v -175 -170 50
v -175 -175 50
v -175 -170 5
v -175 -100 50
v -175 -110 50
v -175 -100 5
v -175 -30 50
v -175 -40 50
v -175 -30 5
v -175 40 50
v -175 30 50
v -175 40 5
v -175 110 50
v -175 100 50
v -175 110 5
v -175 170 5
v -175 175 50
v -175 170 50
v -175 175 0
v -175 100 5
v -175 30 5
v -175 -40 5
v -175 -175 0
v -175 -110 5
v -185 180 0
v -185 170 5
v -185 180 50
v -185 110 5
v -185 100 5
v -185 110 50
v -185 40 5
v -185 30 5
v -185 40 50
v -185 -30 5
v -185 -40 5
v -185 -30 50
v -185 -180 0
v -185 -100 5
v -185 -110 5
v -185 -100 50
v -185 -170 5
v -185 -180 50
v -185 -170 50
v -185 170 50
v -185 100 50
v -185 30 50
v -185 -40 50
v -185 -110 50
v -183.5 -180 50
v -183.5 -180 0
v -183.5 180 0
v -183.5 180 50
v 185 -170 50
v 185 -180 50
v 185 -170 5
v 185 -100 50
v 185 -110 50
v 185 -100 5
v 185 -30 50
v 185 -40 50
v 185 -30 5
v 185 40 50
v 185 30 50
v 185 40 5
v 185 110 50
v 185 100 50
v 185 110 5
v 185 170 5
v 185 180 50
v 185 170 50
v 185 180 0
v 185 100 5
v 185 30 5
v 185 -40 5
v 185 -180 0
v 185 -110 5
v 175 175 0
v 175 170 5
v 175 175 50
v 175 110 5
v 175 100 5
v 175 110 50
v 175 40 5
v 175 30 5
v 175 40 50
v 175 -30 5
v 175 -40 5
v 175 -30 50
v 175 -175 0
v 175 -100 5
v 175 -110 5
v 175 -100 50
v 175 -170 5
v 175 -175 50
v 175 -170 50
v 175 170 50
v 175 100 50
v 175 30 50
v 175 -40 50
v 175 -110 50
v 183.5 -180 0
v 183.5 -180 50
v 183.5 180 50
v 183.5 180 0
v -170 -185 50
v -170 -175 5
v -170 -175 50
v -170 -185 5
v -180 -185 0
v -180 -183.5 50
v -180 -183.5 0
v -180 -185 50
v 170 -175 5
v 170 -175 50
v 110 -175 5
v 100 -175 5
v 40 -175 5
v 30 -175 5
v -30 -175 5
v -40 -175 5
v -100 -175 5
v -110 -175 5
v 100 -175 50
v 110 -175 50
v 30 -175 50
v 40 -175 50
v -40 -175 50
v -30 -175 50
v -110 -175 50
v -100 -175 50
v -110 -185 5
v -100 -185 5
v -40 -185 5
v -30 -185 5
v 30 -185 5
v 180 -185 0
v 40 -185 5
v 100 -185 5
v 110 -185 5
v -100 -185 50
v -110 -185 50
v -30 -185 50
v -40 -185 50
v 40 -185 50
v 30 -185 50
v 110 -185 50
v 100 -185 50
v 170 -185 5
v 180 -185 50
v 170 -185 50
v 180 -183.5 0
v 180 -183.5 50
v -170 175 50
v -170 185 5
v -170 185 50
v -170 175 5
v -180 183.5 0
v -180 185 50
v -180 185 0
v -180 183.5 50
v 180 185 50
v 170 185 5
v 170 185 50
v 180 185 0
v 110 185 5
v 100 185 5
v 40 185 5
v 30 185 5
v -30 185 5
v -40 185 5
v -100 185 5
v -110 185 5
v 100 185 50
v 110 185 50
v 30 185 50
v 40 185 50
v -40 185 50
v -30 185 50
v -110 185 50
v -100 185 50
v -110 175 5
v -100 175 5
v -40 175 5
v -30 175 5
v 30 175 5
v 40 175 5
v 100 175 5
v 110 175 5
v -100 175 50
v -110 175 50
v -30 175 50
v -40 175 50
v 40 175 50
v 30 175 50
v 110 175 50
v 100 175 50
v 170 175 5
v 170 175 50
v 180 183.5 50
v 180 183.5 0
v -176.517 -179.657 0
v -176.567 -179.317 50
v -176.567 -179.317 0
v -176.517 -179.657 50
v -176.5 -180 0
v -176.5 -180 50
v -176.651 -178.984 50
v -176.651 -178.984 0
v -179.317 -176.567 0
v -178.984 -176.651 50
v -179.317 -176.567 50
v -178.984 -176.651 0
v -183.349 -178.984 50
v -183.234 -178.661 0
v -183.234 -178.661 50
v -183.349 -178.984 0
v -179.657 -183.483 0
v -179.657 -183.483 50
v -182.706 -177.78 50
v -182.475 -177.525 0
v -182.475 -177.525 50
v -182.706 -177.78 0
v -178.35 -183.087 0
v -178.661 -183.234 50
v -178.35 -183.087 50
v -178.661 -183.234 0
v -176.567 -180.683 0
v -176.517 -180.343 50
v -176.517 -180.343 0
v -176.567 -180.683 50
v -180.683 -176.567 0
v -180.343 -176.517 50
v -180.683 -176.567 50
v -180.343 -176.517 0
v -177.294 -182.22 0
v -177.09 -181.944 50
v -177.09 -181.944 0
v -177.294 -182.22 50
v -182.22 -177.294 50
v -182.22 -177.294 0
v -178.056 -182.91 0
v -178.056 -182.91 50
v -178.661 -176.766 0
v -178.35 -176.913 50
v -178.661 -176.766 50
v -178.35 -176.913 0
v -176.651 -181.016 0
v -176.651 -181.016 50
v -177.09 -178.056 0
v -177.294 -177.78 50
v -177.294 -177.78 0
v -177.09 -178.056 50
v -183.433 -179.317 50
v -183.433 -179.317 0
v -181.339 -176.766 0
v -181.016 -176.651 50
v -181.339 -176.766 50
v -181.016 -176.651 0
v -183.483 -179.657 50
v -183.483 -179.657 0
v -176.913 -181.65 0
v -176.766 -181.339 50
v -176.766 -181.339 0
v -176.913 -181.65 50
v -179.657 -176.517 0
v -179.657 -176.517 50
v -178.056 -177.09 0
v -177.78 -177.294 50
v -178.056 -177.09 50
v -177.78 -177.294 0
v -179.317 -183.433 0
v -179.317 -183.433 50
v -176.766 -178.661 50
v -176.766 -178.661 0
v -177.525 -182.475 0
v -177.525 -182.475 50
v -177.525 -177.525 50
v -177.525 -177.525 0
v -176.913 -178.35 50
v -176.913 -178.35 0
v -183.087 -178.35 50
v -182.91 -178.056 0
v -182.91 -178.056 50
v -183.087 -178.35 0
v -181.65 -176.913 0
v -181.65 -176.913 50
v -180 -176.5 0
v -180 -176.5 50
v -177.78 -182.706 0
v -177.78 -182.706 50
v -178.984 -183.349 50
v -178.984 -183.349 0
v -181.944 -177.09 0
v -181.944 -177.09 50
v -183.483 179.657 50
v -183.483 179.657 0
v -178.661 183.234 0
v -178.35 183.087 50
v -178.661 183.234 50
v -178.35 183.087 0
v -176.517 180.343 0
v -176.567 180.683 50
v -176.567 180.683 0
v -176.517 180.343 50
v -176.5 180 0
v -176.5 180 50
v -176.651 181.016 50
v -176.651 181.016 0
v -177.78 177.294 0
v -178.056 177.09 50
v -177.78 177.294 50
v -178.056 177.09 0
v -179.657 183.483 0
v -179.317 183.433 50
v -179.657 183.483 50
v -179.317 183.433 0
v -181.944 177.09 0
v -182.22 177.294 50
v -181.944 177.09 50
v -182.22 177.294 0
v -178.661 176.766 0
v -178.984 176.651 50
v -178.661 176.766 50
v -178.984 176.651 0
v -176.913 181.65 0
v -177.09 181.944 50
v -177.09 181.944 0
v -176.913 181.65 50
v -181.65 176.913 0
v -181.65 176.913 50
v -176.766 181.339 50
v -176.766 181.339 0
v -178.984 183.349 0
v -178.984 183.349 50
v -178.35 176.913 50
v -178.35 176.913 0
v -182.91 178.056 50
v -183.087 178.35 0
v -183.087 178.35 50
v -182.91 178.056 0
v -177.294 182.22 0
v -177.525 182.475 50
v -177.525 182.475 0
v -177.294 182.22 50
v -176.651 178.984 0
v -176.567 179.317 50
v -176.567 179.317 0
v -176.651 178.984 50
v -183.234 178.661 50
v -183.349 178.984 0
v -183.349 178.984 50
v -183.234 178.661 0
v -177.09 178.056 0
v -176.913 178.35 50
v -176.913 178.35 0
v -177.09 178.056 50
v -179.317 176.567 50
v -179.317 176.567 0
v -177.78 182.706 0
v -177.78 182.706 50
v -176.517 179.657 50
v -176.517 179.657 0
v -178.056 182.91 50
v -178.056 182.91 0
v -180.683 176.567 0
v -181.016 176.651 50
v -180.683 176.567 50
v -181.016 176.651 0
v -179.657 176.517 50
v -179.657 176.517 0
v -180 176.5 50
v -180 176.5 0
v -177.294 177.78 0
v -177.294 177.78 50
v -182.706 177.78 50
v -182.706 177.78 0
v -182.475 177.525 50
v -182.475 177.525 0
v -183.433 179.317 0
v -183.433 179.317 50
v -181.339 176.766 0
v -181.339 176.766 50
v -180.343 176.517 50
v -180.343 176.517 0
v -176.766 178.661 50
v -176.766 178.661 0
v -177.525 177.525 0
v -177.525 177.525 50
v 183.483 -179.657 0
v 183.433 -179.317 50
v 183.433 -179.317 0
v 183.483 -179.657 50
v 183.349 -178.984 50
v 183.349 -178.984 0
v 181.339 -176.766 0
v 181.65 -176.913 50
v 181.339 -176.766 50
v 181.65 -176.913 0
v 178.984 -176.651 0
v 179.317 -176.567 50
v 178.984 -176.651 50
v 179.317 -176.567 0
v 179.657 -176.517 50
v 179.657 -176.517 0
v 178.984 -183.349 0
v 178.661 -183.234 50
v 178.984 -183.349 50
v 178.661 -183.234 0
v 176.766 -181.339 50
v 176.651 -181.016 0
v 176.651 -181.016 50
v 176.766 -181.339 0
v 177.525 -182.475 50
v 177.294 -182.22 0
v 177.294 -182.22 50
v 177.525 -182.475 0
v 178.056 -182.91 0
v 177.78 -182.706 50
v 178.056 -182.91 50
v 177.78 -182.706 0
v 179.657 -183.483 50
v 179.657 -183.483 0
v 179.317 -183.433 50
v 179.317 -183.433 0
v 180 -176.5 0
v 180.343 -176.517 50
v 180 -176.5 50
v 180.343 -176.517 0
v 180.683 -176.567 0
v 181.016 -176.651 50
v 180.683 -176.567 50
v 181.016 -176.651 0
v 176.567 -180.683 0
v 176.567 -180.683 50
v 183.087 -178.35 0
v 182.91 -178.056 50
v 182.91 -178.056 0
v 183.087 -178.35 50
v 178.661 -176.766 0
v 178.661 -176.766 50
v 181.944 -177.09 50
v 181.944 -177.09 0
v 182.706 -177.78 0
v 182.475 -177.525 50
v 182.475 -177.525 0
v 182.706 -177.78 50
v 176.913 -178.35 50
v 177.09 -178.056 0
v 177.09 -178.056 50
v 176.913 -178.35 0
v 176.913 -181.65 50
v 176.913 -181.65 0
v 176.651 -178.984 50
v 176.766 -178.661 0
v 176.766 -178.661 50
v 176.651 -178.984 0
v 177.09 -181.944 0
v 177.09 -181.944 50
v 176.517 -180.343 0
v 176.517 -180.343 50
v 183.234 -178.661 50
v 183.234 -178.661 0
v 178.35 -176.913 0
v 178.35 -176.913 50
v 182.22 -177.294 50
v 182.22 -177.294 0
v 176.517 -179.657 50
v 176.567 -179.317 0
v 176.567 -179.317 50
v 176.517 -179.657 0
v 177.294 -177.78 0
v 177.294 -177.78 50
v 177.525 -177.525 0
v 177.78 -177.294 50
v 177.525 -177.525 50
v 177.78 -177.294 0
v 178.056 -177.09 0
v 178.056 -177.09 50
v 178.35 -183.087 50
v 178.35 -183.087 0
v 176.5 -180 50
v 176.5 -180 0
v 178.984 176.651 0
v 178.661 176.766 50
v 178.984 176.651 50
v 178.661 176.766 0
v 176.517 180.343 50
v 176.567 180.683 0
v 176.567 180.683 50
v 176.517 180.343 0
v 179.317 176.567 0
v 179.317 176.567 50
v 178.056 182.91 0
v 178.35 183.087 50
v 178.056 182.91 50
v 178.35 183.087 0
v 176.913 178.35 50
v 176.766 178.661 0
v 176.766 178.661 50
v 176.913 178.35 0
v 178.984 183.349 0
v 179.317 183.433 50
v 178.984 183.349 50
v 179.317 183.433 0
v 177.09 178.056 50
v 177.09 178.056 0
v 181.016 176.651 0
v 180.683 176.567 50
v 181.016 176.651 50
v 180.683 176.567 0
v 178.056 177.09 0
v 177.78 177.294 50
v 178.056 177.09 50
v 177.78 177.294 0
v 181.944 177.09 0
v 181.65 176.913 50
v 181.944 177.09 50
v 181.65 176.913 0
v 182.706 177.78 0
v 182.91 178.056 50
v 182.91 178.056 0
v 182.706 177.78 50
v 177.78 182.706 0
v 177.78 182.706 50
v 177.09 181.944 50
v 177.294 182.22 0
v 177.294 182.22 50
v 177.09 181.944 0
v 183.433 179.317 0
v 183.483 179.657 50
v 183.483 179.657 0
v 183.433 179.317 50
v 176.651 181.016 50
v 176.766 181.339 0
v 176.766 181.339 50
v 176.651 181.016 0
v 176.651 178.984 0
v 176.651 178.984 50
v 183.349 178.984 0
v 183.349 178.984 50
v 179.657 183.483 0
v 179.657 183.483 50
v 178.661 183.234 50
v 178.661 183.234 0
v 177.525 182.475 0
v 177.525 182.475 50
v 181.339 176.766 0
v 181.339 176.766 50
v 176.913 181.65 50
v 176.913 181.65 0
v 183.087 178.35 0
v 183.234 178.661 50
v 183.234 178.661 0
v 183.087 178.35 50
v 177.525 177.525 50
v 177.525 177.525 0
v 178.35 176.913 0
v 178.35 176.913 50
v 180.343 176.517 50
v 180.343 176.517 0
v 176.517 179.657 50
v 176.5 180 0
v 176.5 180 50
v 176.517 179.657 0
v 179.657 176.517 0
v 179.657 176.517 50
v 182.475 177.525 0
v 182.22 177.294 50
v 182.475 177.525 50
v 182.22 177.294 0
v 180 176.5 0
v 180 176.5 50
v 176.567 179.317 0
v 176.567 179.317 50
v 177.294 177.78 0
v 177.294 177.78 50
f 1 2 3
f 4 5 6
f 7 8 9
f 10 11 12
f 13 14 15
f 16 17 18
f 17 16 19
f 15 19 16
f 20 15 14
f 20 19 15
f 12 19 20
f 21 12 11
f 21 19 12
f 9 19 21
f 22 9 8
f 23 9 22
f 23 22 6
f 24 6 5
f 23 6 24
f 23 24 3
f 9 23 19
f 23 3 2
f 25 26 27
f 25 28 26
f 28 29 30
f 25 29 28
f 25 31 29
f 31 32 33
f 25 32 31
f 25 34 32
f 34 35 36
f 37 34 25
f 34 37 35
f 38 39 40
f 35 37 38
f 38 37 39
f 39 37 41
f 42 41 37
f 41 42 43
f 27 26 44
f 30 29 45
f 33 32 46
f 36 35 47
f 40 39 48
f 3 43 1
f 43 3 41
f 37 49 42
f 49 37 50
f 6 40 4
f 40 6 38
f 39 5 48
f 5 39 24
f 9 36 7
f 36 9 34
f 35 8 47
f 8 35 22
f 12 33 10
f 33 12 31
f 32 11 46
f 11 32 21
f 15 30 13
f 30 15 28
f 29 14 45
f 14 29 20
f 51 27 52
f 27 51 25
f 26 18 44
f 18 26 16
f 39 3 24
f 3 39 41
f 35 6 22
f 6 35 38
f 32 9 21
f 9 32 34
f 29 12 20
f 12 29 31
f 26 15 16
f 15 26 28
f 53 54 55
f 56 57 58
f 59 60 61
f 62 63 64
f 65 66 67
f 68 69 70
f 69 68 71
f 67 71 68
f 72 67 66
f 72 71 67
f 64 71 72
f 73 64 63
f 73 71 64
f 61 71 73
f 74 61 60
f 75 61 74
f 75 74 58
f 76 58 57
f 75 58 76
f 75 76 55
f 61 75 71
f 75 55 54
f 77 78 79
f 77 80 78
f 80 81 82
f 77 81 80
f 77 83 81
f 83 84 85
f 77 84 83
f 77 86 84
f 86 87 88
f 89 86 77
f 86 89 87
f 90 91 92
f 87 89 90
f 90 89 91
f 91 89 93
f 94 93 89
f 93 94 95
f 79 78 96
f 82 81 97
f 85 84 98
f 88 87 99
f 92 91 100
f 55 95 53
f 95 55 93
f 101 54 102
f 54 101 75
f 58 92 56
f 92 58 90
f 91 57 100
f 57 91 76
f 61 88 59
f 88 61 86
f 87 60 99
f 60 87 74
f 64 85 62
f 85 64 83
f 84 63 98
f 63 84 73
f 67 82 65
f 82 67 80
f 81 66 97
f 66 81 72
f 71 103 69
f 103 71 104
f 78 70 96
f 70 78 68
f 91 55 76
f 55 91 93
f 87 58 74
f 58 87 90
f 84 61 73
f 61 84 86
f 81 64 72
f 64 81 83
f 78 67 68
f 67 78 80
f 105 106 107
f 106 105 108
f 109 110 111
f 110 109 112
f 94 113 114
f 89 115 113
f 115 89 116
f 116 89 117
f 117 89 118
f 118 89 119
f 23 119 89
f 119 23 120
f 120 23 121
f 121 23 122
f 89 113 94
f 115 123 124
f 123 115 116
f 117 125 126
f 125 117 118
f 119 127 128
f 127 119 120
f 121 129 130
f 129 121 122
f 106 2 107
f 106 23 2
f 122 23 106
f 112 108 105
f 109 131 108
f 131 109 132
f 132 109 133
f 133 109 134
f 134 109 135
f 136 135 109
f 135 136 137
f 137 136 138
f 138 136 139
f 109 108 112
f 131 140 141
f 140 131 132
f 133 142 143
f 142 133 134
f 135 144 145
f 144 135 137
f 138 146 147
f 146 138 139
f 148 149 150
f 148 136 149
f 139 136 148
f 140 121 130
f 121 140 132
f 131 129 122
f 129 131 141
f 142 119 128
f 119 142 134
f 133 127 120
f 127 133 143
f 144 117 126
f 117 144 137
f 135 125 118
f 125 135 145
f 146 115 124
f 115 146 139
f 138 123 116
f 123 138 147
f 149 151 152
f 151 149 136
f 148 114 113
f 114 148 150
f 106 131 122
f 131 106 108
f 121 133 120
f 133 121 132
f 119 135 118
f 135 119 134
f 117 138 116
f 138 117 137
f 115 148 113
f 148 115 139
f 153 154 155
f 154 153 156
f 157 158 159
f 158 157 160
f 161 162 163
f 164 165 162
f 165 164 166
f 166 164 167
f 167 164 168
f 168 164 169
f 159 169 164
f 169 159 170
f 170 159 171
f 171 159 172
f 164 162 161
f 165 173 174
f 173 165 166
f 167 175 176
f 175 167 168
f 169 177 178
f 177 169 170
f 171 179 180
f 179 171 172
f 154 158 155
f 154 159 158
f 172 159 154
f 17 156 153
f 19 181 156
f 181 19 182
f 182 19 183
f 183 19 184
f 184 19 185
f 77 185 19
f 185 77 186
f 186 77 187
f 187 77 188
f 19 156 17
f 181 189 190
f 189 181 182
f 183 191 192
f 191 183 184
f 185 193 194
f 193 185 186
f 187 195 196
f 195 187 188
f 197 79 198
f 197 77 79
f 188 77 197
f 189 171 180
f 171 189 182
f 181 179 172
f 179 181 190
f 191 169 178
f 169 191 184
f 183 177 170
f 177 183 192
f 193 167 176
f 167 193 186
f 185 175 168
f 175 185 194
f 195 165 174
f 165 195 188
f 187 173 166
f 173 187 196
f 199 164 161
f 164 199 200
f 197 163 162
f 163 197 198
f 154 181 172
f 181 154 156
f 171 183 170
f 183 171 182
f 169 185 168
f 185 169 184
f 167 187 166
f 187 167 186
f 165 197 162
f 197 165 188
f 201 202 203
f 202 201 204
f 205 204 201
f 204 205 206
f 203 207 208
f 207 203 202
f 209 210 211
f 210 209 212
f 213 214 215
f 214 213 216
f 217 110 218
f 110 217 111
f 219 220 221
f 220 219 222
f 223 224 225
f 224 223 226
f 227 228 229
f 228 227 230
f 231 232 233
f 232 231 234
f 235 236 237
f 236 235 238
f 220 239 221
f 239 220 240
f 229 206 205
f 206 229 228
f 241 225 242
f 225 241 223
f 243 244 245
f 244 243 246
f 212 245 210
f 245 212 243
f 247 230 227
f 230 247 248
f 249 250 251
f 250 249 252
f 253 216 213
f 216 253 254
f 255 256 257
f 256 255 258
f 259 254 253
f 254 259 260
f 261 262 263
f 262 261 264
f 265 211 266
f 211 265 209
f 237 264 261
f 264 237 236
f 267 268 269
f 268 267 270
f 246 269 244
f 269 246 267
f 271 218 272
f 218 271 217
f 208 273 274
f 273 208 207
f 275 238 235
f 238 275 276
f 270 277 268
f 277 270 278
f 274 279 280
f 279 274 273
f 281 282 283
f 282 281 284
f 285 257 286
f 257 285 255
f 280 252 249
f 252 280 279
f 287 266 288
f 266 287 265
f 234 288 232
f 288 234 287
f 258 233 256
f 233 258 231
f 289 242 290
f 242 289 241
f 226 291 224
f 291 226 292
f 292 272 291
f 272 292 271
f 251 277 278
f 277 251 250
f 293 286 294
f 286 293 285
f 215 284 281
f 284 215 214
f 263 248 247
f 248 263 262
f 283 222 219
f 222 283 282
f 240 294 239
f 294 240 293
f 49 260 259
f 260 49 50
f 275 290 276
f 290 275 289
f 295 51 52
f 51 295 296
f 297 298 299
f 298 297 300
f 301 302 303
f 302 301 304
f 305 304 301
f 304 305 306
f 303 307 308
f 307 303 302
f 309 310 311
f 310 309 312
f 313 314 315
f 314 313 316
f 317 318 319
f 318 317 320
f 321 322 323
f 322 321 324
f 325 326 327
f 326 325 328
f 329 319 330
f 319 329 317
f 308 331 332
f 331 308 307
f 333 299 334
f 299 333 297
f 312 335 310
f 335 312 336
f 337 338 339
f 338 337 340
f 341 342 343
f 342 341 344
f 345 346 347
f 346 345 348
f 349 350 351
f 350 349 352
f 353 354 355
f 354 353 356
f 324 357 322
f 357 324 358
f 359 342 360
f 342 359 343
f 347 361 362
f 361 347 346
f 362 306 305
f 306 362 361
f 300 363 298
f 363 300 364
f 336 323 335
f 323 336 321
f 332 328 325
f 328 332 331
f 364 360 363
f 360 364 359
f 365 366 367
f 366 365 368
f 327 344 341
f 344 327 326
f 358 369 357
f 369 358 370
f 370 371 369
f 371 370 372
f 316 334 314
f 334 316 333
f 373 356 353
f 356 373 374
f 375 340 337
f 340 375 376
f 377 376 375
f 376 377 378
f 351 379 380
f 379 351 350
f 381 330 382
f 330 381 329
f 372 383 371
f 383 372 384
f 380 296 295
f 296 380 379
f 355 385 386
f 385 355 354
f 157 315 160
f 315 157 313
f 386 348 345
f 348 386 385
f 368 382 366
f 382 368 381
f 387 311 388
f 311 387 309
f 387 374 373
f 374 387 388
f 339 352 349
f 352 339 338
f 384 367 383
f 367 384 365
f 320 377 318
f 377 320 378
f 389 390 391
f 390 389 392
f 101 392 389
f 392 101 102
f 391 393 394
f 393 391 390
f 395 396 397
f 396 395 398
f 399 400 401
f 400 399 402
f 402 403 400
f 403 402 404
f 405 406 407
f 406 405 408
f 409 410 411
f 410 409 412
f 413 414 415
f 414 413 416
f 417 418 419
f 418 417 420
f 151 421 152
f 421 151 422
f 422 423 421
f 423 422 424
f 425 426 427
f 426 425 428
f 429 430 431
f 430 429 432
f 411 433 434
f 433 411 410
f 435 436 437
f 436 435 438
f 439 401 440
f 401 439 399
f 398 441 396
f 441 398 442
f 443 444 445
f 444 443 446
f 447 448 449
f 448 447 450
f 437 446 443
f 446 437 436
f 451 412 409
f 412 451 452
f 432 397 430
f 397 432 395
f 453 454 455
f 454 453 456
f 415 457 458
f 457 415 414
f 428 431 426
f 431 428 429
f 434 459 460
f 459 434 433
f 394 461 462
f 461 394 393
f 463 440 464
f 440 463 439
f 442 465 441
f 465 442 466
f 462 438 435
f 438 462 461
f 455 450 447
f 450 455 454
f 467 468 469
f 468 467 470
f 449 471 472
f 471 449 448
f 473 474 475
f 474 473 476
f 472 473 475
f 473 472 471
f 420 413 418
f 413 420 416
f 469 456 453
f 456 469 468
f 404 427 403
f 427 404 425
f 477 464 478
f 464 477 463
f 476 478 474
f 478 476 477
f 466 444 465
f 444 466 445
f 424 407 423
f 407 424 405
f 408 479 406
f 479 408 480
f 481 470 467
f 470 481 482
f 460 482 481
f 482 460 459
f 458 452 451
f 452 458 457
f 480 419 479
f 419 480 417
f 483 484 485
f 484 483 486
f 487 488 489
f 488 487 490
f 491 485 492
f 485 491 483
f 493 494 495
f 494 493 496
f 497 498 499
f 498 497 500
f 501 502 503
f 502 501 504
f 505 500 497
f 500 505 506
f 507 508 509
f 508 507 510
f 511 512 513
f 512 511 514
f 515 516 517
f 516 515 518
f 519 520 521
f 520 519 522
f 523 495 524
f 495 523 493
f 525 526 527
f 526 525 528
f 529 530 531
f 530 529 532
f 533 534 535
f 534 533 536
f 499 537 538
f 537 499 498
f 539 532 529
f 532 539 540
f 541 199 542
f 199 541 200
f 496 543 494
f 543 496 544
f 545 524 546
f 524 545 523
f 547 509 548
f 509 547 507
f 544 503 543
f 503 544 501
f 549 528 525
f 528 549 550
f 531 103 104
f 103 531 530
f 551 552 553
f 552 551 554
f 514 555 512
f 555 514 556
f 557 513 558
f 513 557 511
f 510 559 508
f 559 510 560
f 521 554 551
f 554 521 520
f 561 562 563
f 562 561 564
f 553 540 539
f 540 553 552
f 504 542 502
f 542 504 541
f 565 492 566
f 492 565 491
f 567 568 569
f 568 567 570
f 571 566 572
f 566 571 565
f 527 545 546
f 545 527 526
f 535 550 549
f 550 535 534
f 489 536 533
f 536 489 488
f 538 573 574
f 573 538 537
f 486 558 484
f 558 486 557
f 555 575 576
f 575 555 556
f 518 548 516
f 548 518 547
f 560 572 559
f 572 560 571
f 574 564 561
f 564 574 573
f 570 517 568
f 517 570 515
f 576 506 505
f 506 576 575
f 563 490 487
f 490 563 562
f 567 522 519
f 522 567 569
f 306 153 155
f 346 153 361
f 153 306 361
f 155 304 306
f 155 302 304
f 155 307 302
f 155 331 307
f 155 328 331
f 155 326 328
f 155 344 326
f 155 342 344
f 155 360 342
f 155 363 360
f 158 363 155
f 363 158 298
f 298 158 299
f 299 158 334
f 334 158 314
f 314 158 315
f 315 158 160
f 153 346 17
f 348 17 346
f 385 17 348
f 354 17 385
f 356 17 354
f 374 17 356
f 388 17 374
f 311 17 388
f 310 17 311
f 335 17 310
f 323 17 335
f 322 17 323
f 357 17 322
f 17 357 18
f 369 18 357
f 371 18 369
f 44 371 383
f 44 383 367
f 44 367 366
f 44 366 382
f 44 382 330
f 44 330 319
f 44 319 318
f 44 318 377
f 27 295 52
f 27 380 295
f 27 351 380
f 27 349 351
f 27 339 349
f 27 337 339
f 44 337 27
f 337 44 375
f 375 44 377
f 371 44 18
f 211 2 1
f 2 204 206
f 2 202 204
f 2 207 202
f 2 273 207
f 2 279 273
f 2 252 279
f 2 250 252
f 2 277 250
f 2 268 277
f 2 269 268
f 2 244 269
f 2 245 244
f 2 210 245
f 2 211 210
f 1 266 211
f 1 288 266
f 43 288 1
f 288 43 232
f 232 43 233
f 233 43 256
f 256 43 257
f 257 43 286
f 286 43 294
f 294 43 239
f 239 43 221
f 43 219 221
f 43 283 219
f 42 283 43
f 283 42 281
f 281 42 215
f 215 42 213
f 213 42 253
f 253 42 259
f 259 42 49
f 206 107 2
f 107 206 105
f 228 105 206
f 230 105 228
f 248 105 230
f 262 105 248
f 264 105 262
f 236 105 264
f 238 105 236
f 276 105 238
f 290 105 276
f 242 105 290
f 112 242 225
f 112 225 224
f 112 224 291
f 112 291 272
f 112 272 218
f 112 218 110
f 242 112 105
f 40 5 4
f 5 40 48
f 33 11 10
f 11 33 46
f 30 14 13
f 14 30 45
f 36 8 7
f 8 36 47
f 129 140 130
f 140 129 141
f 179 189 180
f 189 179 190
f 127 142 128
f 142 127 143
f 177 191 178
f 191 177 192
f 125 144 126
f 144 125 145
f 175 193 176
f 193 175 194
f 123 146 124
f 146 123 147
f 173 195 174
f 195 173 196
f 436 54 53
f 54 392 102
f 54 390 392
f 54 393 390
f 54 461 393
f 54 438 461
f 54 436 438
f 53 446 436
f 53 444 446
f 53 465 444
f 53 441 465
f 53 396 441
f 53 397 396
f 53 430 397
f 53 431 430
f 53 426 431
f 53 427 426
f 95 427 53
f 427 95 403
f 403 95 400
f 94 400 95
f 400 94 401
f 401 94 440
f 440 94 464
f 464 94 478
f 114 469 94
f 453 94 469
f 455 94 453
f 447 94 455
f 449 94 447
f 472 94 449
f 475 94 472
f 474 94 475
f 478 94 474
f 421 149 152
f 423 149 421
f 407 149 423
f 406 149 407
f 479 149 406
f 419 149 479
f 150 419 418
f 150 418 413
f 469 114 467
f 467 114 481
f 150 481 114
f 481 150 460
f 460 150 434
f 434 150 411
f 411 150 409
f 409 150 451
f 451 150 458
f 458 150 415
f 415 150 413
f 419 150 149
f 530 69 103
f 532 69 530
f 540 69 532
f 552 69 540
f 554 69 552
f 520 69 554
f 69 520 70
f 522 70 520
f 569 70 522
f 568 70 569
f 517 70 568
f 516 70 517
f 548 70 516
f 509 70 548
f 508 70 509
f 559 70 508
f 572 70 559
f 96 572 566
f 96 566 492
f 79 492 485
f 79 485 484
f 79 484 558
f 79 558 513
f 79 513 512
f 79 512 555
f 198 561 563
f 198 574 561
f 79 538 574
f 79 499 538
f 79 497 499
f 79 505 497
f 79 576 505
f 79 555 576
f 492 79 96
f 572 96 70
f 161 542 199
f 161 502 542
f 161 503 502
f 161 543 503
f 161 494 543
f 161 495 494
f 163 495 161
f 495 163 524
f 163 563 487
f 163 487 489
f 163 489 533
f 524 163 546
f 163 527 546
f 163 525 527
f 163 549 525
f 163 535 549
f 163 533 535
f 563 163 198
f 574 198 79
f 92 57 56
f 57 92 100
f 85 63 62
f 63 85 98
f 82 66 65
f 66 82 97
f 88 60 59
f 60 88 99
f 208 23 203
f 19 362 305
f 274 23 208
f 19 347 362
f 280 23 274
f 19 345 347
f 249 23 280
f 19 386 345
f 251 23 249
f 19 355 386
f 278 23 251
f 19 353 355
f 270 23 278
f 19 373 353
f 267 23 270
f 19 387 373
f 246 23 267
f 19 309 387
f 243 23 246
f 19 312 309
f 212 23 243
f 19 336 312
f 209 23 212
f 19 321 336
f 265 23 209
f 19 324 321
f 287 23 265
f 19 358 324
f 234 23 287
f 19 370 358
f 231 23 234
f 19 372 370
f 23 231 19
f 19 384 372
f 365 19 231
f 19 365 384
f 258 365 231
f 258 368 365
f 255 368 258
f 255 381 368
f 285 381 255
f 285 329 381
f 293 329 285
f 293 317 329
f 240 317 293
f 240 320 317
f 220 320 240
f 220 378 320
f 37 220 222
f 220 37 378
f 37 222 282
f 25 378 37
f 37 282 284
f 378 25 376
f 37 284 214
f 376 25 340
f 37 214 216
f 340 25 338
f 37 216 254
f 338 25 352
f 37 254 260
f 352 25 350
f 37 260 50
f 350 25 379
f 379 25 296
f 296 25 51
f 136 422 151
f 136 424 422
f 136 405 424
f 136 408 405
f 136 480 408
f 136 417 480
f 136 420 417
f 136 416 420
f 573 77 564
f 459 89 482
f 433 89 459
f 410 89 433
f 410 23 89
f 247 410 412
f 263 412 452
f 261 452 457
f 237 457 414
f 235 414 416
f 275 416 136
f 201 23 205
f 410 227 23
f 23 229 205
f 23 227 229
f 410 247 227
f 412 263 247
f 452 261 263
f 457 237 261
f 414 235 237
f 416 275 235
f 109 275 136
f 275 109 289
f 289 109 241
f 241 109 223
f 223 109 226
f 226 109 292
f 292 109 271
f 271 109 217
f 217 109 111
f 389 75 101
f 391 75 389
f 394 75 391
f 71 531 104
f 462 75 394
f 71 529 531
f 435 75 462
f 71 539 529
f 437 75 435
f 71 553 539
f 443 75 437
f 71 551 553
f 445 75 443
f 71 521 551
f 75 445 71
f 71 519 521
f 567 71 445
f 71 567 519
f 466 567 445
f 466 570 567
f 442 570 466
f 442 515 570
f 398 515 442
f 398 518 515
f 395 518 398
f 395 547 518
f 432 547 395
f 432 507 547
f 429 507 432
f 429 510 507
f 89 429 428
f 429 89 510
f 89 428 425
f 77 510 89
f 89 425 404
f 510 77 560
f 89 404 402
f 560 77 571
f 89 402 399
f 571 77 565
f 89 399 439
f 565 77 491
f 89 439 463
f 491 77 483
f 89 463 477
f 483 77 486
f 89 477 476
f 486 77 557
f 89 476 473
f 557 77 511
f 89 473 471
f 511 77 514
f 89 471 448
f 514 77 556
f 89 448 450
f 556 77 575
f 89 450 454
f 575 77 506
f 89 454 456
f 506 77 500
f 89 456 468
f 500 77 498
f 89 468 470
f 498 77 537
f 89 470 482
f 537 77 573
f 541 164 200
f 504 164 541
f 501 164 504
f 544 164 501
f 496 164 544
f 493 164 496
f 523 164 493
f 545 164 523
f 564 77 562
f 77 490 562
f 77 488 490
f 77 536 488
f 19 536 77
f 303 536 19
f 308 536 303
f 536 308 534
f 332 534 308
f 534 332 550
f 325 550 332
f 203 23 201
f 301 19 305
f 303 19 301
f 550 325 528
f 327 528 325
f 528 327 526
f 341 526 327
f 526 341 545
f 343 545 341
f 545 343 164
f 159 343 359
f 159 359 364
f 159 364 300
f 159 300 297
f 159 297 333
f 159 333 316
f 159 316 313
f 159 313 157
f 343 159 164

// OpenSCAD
/*
  Cage slice 04 of 15
*/

bar = 10;
half_inner = 175;
gap = 70;
rod_d = 7;
half_outer = half_inner + bar;

function grid_pos(n) = -half_inner + n * gap;

module cage_full() {
  difference() {
    union() {
      // Floor grid at z = -10 .. 0
      for (j = [0:5]) {
        y = grid_pos(j);
        translate([-half_inner, y - bar/2, -bar])
          cube([2*half_inner, bar, bar], center=false);
      }
      for (i = [0:5]) {
        x = grid_pos(i);
        translate([x - bar/2, -half_inner, -bar])
          cube([bar, 2*half_inner, bar], center=false);
      }

      // Roof grid at z = 700 .. 710
      for (j = [0:5]) {
        y = grid_pos(j);
        translate([-half_inner, y - bar/2, 700])
          cube([2*half_inner, bar, bar], center=false);
      }
      for (i = [0:5]) {
        x = grid_pos(i);
        translate([x - bar/2, -half_inner, 700])
          cube([bar, 2*half_inner, bar], center=false);
      }

      // Side walls at x = ±175
      for (side = [-1, 1]) {
        sx = side * half_inner;
        x0 = (side == 1) ? sx : sx - bar;
        for (j = [0:5]) {
          y = grid_pos(j);
          translate([x0, y - bar/2, 0])
            cube([bar, bar, 700], center=false);
        }
        for (k = [0:10]) {
          zc = 0 + k * gap;
          translate([x0, -half_inner, zc - bar/2])
            cube([bar, 2*half_inner, bar], center=false);
        }
      }

      // Front/back walls at y = ±175
      for (side = [-1, 1]) {
        sy = side * half_inner;
        y0 = (side == 1) ? sy : sy - bar;
        for (i = [0:5]) {
          x = grid_pos(i);
          translate([x - bar/2, y0, 0])
            cube([bar, bar, 700], center=false);
        }
        for (k = [0:10]) {
          zc = 0 + k * gap;
          translate([-half_inner, y0, zc - bar/2])
            cube([2*half_inner, bar, bar], center=false);
        }
      }
    }

    for (sx = [-1, 1], sy = [-1, 1]) {
      translate([sx * (half_inner + bar/2),
                 sy * (half_inner + bar/2),
                 -20])
        cylinder(d = rod_d, h = 740, $fn = 64);
    }
  }
}

z_min = 140;
z_max = 190;  // height 50 mm

module slice() {
  intersection() {
    cage_full();
    translate([-half_outer - 5, -half_outer - 5, z_min])
      cube([2*(half_outer + 5), 2*(half_outer + 5), z_max - z_min], center=false);
  }
}

translate([0, 0, -z_min])
  slice();
